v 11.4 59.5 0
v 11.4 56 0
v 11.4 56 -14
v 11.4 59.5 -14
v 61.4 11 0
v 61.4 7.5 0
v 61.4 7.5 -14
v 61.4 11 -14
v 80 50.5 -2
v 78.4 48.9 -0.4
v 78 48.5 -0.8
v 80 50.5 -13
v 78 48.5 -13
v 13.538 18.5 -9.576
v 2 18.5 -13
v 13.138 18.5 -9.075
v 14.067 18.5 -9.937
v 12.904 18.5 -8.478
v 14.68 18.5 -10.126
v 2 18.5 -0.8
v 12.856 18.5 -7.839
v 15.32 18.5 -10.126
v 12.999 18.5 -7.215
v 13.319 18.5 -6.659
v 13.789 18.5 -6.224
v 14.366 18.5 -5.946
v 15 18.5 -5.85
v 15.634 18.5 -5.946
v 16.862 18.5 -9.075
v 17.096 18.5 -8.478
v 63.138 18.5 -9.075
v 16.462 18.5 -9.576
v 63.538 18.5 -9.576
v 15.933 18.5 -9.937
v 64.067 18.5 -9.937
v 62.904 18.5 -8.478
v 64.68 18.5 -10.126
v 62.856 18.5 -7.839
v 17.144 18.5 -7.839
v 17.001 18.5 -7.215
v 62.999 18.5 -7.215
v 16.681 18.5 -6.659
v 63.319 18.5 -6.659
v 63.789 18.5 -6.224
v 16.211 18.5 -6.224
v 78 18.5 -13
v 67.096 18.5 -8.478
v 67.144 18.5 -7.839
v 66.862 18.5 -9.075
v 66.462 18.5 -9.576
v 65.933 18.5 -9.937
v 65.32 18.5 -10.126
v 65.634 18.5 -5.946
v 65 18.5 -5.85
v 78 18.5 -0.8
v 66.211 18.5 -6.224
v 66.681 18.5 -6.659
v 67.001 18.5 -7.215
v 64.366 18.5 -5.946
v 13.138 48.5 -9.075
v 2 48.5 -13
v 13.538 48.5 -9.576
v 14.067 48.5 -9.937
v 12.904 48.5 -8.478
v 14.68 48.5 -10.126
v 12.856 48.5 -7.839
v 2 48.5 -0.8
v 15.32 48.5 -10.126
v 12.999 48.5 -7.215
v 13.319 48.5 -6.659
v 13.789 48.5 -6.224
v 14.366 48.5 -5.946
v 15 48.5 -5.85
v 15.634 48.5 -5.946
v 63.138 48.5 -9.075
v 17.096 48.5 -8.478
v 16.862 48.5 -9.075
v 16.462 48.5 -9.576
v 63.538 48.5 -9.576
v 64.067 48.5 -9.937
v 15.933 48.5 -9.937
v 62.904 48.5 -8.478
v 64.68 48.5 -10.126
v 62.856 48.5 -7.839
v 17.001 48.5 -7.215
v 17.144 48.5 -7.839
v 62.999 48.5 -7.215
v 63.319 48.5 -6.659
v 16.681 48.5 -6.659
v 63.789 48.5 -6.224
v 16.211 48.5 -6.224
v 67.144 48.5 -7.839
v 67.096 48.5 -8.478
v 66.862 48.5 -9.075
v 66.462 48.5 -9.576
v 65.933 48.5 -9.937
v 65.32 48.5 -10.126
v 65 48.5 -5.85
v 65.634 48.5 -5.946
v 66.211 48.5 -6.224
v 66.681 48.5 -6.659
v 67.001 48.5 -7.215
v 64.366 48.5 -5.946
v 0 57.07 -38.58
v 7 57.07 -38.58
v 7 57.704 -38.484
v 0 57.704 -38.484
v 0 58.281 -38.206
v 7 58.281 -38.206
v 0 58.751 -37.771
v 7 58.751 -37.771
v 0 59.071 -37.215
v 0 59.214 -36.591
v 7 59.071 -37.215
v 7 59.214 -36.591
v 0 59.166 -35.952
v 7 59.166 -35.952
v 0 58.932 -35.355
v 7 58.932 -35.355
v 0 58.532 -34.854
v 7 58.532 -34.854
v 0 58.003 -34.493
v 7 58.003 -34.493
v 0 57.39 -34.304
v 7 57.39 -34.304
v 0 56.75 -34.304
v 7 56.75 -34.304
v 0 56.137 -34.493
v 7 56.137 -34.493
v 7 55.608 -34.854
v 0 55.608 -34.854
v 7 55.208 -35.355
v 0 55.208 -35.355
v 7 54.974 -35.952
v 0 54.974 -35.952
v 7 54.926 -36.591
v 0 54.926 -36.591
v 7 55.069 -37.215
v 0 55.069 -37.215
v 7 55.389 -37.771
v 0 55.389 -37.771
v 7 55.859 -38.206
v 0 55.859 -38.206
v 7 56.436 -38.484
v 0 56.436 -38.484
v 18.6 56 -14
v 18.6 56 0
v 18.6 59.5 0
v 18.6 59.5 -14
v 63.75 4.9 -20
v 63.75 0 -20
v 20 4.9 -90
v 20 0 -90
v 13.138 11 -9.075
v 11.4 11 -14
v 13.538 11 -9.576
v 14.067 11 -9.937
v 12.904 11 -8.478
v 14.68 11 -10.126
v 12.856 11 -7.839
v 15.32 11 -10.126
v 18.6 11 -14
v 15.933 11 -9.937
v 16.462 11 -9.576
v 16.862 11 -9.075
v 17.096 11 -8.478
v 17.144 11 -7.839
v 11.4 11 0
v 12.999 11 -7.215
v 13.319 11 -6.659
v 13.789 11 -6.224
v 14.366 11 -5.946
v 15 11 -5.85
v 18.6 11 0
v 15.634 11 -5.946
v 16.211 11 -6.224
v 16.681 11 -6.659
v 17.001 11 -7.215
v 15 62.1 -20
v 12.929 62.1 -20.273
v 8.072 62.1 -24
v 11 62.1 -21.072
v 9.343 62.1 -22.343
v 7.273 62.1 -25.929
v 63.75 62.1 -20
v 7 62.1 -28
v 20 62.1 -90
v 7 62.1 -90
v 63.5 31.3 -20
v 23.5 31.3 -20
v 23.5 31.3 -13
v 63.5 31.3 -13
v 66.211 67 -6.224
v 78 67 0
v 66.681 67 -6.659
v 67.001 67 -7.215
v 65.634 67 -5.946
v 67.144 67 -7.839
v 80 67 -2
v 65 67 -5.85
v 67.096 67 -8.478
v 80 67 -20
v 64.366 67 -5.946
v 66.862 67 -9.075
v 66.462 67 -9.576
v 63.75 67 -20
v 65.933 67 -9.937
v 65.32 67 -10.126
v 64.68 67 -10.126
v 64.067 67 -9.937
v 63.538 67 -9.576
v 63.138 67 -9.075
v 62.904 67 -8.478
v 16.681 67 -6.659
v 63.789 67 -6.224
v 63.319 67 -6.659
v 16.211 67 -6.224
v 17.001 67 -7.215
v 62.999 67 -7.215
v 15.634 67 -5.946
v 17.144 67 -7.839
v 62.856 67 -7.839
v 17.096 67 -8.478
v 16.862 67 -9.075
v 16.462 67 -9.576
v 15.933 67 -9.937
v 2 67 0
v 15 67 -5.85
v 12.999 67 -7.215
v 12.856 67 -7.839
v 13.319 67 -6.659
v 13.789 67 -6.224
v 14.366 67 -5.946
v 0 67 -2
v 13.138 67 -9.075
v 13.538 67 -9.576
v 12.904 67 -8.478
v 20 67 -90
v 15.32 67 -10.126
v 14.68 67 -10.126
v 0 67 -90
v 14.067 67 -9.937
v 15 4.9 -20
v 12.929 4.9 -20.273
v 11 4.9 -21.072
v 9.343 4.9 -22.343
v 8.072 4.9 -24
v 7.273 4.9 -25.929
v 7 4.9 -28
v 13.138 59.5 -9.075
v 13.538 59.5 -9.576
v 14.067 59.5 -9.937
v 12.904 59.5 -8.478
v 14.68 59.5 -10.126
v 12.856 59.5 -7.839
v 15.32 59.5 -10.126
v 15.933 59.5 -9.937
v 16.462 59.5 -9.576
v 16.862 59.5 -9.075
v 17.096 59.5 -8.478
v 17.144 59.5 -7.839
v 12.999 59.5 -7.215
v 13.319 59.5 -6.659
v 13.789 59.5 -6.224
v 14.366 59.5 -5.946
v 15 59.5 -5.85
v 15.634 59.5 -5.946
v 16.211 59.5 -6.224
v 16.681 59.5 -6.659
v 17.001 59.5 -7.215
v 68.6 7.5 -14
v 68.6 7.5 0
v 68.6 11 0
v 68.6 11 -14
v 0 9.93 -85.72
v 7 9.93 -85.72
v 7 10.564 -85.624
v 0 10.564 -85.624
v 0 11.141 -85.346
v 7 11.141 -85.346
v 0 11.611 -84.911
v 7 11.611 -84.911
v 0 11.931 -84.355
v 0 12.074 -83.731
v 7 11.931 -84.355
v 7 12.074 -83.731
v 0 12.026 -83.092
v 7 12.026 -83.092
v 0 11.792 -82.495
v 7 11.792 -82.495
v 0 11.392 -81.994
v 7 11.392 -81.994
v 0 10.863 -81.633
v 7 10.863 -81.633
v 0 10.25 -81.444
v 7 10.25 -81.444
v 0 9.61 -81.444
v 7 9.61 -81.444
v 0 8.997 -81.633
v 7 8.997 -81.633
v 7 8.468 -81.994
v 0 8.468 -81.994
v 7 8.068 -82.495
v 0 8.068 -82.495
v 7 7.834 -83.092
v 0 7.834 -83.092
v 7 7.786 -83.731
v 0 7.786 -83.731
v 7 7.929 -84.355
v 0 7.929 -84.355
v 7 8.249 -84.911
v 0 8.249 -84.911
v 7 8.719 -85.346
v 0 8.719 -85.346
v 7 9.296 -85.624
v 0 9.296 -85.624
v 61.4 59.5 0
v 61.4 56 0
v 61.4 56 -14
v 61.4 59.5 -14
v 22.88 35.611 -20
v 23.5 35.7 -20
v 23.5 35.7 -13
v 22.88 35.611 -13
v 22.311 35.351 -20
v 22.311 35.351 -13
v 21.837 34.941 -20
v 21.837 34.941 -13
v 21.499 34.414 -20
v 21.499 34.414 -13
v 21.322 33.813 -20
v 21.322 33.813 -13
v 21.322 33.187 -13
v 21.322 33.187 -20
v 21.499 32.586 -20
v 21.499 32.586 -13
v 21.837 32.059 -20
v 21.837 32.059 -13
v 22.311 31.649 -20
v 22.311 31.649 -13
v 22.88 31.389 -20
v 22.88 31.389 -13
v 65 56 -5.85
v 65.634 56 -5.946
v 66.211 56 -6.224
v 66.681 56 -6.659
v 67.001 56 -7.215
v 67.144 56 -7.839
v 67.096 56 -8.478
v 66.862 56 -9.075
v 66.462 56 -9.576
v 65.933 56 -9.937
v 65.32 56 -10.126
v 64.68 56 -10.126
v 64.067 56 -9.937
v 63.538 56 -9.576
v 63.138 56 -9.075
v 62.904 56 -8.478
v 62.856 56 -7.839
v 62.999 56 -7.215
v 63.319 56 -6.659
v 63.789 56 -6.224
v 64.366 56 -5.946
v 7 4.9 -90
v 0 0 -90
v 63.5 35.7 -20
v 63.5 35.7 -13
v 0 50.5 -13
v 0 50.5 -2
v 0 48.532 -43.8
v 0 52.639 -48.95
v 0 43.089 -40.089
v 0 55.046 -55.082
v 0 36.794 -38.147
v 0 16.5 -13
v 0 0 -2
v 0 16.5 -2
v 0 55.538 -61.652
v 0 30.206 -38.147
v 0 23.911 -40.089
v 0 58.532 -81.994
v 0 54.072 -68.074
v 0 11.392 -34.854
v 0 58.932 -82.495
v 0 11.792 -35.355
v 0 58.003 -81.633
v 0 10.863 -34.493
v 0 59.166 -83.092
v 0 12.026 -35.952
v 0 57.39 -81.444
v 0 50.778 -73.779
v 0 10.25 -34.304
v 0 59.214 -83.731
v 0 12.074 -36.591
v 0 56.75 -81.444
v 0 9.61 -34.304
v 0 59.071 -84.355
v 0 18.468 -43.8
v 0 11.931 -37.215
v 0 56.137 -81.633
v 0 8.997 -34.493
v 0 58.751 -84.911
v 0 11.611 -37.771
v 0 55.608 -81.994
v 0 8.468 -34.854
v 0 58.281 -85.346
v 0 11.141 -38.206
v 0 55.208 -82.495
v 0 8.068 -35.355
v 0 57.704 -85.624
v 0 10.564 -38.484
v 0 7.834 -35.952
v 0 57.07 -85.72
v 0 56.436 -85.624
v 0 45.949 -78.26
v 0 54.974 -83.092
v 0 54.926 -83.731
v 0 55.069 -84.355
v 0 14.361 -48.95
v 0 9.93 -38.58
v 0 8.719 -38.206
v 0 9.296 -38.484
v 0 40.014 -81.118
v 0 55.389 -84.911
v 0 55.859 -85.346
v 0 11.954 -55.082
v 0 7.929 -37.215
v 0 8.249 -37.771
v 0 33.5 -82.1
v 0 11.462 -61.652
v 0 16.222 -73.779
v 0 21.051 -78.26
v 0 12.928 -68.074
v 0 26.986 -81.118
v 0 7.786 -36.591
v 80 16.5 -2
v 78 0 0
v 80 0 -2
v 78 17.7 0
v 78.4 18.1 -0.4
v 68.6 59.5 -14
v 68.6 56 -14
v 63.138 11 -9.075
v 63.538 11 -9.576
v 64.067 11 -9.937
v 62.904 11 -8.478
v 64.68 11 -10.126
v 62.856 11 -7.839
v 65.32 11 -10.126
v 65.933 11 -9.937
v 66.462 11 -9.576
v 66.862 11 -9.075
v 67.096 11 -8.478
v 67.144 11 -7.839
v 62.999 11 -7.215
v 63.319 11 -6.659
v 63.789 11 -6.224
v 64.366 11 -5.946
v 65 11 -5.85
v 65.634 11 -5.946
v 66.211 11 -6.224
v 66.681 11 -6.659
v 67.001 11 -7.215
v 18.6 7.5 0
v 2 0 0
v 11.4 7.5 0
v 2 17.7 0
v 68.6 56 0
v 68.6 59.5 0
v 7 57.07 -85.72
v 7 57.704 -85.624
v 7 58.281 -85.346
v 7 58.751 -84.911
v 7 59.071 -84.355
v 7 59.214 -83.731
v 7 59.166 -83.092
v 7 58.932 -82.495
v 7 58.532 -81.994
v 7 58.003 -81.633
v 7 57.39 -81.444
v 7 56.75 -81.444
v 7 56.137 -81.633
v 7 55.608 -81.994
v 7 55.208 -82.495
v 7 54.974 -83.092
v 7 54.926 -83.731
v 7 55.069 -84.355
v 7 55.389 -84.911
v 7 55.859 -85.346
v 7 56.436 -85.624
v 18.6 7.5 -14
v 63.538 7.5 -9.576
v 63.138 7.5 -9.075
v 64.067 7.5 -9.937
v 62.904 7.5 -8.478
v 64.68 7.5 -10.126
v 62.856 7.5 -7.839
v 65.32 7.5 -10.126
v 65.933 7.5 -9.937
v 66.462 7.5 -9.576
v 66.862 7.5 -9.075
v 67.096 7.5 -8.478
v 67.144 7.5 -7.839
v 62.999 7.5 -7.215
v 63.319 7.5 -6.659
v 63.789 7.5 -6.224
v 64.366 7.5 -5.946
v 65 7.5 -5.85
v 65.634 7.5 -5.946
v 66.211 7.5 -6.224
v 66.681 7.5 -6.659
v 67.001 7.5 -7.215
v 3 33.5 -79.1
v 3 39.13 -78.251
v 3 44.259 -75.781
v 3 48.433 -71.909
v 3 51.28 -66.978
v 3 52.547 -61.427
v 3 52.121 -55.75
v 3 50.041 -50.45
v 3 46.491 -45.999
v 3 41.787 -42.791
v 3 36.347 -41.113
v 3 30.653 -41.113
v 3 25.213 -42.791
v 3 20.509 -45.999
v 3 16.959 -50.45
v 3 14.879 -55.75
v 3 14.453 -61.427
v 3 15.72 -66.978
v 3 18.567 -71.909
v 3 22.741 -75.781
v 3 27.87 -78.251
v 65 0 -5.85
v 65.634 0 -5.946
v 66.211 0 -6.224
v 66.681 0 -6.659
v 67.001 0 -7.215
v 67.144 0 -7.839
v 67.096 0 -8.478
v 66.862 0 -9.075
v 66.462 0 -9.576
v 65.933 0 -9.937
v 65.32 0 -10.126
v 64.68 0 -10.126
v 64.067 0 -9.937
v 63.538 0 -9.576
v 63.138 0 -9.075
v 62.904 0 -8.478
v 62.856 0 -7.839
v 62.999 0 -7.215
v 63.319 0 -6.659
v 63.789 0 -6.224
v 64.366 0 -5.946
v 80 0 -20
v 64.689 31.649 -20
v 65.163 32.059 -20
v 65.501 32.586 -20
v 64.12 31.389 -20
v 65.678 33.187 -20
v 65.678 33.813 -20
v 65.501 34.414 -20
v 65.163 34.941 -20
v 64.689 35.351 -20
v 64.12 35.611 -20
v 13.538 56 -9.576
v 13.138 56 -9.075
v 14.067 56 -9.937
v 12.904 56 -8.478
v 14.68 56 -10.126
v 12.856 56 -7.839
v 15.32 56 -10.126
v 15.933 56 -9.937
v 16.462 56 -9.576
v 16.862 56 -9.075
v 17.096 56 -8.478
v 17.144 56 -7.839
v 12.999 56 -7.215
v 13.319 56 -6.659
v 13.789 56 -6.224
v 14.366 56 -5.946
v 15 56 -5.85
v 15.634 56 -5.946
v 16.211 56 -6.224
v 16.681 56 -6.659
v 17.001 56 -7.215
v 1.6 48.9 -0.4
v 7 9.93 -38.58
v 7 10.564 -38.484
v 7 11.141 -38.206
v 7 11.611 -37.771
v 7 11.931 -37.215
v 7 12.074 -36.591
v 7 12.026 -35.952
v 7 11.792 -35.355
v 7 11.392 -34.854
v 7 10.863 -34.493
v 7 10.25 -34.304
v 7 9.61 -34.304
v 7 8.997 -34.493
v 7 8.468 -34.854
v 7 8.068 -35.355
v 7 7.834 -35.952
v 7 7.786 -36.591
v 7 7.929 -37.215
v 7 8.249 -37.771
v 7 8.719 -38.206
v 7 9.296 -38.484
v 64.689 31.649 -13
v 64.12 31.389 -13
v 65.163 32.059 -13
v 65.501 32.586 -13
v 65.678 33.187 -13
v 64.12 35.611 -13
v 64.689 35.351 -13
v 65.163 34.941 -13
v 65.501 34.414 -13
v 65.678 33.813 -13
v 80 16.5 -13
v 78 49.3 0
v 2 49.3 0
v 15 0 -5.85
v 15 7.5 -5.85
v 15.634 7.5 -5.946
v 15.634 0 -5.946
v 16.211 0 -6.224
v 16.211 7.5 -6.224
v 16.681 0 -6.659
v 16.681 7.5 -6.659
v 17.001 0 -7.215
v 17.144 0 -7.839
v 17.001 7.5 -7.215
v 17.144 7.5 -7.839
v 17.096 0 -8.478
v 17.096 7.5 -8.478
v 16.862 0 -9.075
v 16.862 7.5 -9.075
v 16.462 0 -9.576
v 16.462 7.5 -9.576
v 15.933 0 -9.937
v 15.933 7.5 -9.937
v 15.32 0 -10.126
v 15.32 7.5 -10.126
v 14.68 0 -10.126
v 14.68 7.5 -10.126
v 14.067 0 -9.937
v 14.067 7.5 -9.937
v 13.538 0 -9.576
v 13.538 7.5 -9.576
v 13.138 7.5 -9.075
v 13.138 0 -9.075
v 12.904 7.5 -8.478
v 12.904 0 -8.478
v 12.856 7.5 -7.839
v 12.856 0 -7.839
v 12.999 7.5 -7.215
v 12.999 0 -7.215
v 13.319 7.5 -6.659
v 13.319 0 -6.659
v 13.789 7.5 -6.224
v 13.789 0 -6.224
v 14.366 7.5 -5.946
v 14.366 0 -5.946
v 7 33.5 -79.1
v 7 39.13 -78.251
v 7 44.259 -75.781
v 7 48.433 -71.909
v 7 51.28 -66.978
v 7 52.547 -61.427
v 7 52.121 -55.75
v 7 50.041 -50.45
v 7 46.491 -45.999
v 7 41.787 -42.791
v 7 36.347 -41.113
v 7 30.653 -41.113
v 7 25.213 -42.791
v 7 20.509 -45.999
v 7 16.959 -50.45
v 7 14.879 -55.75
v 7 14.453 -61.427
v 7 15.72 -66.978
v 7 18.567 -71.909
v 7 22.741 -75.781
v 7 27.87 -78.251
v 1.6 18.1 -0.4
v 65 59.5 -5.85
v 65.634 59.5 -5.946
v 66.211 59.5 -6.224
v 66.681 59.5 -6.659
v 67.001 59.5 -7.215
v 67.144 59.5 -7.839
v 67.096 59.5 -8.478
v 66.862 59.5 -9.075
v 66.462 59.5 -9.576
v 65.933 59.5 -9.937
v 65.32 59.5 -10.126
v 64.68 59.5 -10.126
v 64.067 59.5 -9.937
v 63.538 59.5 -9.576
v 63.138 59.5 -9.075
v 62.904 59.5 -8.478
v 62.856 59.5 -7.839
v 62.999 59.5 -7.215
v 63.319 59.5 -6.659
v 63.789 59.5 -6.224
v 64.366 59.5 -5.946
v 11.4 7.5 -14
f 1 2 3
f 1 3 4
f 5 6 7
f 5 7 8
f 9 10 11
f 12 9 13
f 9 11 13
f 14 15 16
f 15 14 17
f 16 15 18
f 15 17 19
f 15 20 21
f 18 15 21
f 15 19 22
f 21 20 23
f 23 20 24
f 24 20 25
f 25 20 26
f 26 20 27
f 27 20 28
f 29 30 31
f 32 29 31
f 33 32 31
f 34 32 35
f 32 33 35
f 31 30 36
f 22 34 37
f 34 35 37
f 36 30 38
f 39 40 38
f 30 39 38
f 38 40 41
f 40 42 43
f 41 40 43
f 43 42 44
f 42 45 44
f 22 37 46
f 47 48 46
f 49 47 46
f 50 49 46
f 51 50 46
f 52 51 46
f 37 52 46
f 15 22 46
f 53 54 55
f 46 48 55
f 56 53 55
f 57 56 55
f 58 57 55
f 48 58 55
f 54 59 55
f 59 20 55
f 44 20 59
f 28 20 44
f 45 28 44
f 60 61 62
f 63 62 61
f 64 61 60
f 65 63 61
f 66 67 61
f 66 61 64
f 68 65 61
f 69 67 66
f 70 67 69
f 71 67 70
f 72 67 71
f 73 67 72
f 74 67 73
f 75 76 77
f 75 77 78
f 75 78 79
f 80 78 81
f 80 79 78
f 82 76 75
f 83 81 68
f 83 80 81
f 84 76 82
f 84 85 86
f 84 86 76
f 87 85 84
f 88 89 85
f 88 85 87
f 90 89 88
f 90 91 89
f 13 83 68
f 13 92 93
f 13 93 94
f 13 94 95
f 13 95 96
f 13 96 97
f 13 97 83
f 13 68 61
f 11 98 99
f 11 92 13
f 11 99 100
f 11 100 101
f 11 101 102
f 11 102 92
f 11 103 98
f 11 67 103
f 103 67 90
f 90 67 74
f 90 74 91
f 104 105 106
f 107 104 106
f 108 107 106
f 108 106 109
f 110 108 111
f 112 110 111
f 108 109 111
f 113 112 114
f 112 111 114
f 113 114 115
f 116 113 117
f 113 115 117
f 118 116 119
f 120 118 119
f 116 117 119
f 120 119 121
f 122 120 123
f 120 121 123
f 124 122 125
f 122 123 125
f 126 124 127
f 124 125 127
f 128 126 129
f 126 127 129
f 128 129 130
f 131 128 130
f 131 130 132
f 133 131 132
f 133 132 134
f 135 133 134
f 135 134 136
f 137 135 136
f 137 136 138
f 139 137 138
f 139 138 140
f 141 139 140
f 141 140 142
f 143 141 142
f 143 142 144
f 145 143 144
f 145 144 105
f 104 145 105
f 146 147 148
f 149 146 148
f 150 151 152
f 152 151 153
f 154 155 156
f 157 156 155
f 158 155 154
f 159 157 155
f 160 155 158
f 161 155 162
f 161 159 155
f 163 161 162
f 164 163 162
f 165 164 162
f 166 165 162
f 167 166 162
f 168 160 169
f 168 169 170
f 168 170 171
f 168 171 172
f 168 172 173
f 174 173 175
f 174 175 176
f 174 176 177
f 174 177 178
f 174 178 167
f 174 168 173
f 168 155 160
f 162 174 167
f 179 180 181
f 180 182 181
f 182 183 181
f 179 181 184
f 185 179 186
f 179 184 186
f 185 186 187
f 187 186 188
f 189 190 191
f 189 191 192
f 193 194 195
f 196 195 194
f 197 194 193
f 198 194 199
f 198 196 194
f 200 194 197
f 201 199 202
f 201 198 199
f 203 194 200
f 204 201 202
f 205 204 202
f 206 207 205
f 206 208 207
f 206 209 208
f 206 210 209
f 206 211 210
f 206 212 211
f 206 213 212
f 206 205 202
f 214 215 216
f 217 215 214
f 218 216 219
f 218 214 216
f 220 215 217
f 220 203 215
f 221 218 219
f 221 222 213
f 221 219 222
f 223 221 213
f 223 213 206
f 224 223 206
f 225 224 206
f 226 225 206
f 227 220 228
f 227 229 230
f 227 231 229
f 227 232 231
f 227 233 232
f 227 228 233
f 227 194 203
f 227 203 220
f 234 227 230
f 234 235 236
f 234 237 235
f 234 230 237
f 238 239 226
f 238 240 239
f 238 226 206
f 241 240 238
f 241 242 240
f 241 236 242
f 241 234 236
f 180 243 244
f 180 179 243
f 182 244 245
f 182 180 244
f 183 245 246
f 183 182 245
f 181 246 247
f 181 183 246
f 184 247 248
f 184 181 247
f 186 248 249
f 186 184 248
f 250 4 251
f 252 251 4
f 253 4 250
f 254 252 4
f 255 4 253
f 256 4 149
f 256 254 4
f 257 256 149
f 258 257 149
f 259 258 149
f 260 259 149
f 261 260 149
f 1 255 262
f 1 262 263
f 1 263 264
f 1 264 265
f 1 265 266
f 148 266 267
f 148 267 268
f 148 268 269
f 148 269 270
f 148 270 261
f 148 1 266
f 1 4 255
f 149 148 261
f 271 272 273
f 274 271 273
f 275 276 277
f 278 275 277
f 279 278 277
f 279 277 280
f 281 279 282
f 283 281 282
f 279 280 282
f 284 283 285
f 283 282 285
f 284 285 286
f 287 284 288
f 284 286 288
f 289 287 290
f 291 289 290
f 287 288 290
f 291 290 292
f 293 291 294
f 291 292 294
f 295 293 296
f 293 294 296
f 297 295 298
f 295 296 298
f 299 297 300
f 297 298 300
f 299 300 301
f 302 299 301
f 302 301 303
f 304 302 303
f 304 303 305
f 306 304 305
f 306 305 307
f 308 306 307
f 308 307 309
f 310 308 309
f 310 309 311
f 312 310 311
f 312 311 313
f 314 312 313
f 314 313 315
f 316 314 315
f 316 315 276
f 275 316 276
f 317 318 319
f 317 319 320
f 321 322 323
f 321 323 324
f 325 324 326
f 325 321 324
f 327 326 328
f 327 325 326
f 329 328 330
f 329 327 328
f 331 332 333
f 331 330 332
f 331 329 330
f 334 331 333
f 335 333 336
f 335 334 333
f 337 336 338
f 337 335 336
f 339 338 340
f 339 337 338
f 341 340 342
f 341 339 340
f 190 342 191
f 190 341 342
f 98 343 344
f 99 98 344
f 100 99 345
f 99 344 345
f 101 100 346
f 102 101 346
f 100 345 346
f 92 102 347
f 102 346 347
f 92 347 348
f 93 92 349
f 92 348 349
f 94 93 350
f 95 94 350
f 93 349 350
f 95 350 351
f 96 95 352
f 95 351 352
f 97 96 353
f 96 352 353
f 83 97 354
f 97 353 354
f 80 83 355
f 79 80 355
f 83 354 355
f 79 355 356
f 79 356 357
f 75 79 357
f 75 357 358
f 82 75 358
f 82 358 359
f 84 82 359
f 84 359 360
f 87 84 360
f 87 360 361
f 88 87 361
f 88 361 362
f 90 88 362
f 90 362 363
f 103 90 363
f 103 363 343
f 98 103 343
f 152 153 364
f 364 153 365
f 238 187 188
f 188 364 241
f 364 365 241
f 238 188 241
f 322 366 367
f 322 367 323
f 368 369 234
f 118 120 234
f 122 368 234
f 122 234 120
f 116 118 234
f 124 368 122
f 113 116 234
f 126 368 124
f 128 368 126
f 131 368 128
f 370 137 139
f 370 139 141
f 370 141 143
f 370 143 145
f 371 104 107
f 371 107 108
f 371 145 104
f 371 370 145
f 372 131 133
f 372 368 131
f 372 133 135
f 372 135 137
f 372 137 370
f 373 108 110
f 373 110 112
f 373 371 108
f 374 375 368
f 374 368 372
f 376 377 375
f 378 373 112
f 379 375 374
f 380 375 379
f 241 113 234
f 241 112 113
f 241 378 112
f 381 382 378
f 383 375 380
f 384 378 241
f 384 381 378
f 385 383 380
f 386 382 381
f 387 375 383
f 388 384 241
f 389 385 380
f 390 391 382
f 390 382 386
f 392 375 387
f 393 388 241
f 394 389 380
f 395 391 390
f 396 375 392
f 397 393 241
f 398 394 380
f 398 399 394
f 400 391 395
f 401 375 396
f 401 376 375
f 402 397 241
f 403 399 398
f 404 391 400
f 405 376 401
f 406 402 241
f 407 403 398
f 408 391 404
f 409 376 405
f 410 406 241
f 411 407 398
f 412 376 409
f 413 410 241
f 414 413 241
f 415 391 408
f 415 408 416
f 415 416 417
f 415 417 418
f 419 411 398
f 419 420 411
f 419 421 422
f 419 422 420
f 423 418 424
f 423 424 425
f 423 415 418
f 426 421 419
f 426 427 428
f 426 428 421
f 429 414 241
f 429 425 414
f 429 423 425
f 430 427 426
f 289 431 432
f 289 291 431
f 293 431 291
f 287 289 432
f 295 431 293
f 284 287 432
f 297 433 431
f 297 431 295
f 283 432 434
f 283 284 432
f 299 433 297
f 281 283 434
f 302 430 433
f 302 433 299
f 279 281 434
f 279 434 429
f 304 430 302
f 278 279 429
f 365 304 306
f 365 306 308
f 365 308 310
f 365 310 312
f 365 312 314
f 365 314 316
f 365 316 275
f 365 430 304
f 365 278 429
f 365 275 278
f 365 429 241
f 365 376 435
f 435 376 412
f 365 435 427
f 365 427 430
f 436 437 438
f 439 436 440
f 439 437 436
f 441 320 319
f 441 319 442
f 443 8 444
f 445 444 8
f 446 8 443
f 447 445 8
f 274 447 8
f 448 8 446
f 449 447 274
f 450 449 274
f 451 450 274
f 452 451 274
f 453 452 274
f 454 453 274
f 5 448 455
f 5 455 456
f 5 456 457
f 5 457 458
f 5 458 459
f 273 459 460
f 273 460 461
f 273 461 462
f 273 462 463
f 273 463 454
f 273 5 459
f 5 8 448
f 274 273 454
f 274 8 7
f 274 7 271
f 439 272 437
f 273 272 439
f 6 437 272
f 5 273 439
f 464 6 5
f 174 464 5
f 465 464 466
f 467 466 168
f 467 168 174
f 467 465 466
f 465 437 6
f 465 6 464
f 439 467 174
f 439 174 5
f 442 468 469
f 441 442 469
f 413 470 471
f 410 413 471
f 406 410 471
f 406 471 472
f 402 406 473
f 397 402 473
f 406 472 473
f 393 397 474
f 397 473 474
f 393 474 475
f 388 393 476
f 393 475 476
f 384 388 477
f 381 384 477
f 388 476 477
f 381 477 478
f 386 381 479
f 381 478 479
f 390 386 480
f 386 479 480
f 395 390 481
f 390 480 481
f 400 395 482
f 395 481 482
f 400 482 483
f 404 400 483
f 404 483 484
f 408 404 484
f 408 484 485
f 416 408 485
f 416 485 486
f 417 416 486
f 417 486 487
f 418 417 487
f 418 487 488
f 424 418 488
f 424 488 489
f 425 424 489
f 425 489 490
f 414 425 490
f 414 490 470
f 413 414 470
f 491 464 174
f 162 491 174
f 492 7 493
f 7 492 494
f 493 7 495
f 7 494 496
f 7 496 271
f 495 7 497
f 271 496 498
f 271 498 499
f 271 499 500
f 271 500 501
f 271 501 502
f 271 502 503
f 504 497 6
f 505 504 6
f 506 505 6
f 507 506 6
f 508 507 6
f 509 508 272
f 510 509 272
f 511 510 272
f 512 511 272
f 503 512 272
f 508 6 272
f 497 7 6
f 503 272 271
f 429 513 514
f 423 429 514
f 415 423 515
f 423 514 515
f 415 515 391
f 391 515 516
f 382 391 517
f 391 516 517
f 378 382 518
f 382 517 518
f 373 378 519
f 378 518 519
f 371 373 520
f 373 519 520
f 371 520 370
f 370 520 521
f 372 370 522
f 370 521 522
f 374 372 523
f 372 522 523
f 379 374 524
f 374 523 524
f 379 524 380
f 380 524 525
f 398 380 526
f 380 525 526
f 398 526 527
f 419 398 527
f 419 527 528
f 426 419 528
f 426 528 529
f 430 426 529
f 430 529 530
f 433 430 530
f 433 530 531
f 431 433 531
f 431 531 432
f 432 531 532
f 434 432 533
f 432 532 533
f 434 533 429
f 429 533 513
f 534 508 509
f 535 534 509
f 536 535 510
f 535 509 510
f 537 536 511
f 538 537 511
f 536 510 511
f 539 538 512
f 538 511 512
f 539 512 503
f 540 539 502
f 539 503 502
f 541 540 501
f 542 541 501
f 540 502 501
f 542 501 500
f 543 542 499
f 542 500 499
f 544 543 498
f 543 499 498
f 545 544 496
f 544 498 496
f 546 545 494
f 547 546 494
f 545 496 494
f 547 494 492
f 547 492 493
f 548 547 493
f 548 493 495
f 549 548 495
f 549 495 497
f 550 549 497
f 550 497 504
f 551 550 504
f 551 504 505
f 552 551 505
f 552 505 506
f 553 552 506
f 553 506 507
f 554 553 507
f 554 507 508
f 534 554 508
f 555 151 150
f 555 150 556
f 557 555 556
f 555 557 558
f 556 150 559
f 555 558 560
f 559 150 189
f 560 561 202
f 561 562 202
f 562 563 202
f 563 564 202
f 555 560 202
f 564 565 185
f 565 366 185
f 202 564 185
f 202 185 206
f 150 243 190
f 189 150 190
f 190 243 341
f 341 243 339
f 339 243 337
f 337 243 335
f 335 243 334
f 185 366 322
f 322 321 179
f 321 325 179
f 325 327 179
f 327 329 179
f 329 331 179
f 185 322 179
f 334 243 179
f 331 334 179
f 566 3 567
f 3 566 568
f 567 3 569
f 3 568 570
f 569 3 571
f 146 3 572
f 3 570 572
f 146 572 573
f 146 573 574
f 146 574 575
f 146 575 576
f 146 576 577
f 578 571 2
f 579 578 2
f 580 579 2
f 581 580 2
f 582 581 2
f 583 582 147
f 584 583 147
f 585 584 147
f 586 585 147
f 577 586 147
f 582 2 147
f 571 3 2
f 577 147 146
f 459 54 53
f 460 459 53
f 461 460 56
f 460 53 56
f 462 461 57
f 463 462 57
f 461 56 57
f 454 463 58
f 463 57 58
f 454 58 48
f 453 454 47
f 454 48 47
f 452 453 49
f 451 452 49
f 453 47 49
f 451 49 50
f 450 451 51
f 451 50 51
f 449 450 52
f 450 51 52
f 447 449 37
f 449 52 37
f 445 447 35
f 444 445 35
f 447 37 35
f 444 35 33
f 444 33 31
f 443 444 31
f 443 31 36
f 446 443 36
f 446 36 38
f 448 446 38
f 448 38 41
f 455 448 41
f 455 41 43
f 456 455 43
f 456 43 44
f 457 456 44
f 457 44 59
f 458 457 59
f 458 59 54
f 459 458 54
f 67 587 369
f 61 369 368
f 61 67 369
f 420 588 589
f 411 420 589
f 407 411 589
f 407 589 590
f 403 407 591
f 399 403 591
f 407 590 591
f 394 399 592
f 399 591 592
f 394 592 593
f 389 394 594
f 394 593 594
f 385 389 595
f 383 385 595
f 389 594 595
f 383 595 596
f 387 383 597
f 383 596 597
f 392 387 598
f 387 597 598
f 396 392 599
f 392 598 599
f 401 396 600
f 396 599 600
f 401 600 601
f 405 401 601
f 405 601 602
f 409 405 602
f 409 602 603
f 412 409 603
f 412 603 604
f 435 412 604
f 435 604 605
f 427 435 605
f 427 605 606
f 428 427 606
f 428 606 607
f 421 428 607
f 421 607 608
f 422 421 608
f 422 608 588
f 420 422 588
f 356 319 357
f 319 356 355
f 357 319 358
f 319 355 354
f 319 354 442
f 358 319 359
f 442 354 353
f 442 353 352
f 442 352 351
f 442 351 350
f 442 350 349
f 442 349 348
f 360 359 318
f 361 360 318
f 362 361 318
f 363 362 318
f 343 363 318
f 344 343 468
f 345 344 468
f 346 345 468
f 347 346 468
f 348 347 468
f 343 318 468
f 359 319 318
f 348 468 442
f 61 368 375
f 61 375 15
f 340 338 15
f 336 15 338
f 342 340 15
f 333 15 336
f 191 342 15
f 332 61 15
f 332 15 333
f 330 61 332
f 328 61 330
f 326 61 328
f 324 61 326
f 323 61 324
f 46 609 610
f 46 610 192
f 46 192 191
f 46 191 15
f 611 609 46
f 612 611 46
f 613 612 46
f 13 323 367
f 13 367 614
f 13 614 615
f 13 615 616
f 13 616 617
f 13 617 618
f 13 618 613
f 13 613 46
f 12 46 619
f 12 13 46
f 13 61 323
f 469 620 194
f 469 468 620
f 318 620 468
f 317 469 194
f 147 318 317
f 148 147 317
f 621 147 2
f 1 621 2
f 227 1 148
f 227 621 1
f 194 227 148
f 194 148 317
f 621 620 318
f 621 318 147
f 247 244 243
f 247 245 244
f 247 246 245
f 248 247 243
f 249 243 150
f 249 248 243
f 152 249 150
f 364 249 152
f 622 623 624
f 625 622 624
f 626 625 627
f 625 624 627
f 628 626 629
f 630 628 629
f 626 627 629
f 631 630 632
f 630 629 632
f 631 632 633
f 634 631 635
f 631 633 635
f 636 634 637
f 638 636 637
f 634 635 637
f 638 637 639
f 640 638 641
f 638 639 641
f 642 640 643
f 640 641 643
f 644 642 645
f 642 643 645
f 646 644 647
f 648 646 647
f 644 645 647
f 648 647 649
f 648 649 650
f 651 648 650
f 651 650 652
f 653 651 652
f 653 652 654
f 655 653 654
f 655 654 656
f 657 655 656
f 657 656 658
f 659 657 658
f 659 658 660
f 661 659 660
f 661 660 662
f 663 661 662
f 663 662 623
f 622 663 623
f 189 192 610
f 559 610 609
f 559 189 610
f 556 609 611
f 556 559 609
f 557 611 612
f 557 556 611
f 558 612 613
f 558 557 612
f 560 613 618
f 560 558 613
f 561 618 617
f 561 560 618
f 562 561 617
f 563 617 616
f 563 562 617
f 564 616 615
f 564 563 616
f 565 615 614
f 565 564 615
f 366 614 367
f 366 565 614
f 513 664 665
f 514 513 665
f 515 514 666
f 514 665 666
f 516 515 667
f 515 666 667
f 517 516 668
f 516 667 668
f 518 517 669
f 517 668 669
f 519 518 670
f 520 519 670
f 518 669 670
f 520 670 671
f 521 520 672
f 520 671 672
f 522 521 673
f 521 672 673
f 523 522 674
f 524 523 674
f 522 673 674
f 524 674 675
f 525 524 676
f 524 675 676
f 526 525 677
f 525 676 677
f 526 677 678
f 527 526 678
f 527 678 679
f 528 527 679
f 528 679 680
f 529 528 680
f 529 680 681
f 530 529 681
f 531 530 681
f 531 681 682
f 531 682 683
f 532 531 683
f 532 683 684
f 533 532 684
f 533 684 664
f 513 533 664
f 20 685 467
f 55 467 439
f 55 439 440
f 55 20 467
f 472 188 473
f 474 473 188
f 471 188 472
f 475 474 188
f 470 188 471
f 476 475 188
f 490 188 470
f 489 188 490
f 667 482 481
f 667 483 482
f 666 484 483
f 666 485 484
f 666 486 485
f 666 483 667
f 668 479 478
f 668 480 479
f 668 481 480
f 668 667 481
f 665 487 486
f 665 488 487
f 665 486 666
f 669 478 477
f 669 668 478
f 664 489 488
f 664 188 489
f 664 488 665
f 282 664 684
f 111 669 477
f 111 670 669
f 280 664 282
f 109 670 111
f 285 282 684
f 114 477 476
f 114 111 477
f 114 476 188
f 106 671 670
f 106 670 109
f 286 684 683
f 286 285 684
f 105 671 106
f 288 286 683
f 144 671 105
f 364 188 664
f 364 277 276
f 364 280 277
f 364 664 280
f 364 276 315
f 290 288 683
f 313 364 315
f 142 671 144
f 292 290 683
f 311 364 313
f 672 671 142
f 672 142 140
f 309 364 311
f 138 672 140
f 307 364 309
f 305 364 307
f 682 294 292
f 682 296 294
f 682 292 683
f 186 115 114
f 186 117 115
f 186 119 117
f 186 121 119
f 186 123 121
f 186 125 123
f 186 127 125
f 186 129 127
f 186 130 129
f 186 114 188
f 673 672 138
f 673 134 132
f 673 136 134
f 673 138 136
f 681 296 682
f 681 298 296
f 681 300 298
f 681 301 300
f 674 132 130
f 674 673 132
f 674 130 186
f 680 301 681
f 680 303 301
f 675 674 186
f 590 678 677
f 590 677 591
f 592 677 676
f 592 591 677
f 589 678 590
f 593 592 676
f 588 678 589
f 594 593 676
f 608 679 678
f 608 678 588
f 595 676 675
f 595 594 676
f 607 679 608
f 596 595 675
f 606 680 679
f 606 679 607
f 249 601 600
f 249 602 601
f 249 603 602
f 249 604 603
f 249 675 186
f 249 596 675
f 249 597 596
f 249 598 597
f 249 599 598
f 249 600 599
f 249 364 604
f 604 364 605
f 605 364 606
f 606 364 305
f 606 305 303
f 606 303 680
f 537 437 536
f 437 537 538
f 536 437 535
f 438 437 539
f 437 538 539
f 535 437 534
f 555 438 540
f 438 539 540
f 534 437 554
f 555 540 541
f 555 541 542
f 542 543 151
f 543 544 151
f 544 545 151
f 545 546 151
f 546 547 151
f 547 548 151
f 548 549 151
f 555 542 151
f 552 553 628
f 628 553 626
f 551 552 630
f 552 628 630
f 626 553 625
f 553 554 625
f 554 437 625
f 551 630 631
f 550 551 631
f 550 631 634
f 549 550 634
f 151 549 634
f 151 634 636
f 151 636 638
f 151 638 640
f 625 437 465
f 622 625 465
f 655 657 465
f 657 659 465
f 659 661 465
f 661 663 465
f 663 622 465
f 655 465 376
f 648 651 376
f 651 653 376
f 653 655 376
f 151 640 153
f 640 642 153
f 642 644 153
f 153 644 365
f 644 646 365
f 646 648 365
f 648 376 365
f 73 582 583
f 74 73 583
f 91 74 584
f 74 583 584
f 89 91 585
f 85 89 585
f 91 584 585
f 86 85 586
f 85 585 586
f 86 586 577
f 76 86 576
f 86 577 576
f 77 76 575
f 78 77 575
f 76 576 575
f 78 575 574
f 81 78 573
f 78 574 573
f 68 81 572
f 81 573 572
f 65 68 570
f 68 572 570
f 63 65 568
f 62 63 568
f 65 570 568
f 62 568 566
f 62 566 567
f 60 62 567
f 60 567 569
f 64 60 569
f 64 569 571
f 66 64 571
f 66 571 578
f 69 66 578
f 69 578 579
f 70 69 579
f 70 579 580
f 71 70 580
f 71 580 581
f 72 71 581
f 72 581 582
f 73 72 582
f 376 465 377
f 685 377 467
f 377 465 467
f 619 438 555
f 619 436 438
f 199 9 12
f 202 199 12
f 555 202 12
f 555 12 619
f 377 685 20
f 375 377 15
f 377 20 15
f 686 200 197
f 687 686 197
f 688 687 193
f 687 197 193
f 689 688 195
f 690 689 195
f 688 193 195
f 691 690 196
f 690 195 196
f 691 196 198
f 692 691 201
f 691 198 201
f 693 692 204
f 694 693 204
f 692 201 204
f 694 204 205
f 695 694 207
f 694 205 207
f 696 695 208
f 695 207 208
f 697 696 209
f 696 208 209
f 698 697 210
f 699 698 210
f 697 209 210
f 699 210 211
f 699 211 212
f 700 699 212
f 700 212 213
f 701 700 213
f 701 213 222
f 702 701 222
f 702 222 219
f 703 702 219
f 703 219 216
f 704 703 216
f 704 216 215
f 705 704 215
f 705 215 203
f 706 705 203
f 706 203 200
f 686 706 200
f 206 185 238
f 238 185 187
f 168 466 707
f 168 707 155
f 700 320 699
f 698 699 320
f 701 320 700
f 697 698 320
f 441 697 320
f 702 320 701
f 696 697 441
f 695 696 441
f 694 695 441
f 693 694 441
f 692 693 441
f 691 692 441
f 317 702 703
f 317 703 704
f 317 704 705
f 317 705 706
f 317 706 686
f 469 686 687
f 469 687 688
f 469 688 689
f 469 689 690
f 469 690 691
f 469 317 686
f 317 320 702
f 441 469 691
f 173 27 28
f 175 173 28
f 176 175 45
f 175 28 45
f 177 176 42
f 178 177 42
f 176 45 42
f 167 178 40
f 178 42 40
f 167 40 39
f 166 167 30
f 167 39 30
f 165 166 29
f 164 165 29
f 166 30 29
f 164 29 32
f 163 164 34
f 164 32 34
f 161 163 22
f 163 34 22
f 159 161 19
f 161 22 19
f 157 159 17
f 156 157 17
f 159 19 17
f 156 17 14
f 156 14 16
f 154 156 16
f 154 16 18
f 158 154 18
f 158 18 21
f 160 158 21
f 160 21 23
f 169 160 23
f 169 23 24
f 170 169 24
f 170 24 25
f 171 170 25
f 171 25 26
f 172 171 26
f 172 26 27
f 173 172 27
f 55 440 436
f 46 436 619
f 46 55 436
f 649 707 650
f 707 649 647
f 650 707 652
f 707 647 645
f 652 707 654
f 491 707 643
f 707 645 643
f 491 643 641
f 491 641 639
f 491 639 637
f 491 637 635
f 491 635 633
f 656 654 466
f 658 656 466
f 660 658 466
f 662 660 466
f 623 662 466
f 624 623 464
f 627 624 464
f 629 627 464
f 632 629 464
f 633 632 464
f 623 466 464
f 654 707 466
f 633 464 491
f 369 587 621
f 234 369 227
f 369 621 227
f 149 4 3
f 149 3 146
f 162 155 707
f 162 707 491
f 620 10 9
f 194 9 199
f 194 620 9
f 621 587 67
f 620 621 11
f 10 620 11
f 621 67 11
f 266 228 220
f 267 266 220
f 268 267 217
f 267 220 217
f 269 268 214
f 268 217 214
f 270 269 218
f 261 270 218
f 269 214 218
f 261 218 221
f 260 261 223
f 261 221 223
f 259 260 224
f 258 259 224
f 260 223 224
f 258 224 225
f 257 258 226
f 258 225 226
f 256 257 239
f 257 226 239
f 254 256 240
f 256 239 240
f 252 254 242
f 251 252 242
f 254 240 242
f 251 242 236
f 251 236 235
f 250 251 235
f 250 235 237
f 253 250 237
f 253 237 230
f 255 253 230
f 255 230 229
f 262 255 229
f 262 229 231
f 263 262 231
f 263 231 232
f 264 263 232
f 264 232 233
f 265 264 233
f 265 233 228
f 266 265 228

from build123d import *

# Parameters (mm, degrees)
BOSS_EXTRUDE1_DEPTH = 67
SKETCH2_R           = 2.15
SKETCH2_R_2         = 19.1
CUT_EXTRUDE1_DEPTH  = 67
SKETCH3_W           = 70
SKETCH3_H           = 4.9
BOSS_EXTRUDE2_DEPTH = 63
SKETCH4_W           = 20
SKETCH4_H           = 67
BOSS_EXTRUDE3_DEPTH = 10
CHAMFER1_SIZE       = 80
CHAMFER1_SIZE_2     = 50
SKETCH6_W           = 80
SKETCH6_H           = 30
CUT_EXTRUDE2_DEPTH  = 13
SKETCH7_R           = 2.15
CUT_EXTRUDE3_DEPTH  = 100
CUT_EXTRUDE4_DEPTH  = 100
FILLET2_R           = 8
SKETCH9_W           = 7.2
SKETCH9_H           = 3.5
CUT_EXTRUDE5_DEPTH  = 14
CHAMFER2_SIZE       = 2
CHAMFER3_SIZE       = 2
CHAMFER4_SIZE       = 0.8
CHAMFER5_SIZE       = 3


with BuildPart() as part:
    # Sketch1 → Boss-Extrude1 (new body)
    with BuildSketch(Plane(origin=(0, 0, 0), x_dir=(1, 0, 0), z_dir=(0, 1, 0))):
        Polygon((0, 0), (0, 90), (7, 90), (7, 20), (70, 20), (70, 0), align=None)
    extrude(amount=BOSS_EXTRUDE1_DEPTH)

    # Sketch2 → Cut-Extrude1 (cut)
    with BuildSketch(Plane(origin=(7, 0, 0), x_dir=(0, 0, -1), z_dir=(1, 0, 0))):
        with Locations((83.57, 57.07)):
            Circle(SKETCH2_R)
        with Locations((36.43, 57.07)):
            Circle(SKETCH2_R)
        with Locations((36.43, 9.93)):
            Circle(SKETCH2_R)
        with Locations((83.57, 9.93)):
            Circle(SKETCH2_R)
        with Locations((60, 33.5)):
            Circle(SKETCH2_R_2)
    extrude(amount=-CUT_EXTRUDE1_DEPTH, mode=Mode.SUBTRACT)

    # Sketch3 → Boss-Extrude2 (add)
    with BuildSketch(Plane(origin=(7, 0, 0), x_dir=(0, 0, -1), z_dir=(1, 0, 0))):
        with Locations((55, 64.55)):
            Rectangle(SKETCH3_W, SKETCH3_H)
        with Locations((55, 2.45)):
            Rectangle(SKETCH3_W, SKETCH3_H)
    extrude(amount=BOSS_EXTRUDE2_DEPTH)

    # Sketch4 → Boss-Extrude3 (add)
    with BuildSketch(Plane(origin=(70, 0, 0), x_dir=(0, 0, -1), z_dir=(1, 0, 0))):
        with Locations((10, 33.5)):
            Rectangle(SKETCH4_W, SKETCH4_H)
    extrude(amount=BOSS_EXTRUDE3_DEPTH)

    # Chamfer1
    # the kernel refuses this chamfer: 80, 50 mm, written as the material it takes off along each edge
    with BuildSketch(Plane(origin=(70, -206.827451207, -90), x_dir=(0.020500139102813345, 0, 0.9997898500668855), z_dir=(0, 1, 0))) as chamfer1_piece_1_section:
        Polygon((CHAMFER1_SIZE * 0.999789850067, -CHAMFER1_SIZE * 0.0205001391028), (-CHAMFER1_SIZE_2 * 0.0205001391028, -CHAMFER1_SIZE_2 * 0.999789850067), (0, 0), align=None)
    chamfer1_piece_1 = extrude(amount=418.554902414, mode=Mode.PRIVATE)
    chamfer1_piece_1 = split(chamfer1_piece_1, bisect_by=Plane(origin=(53.400446445, 2.45, -20), z_dir=(0, 0, -1)), keep=Keep.TOP, mode=Mode.PRIVATE)
    add(chamfer1_piece_1, mode=Mode.SUBTRACT)
    with BuildSketch(Plane(origin=(70, 273.827451207, -90), x_dir=(0.020500139102813345, 0, 0.9997898500668855), z_dir=(0, -1, 0))) as chamfer1_piece_2_section:
        Polygon((CHAMFER1_SIZE * 0.999789850067, CHAMFER1_SIZE * 0.0205001391028), (-CHAMFER1_SIZE_2 * 0.0205001391028, CHAMFER1_SIZE_2 * 0.999789850067), (0, 0), align=None)
    chamfer1_piece_2 = extrude(amount=418.554902414, mode=Mode.PRIVATE)
    chamfer1_piece_2 = split(chamfer1_piece_2, bisect_by=Plane(origin=(53.400446445, 64.55, -20), z_dir=(0, 0, -1)), keep=Keep.TOP, mode=Mode.PRIVATE)
    add(chamfer1_piece_2, mode=Mode.SUBTRACT)

    # Sketch6 → Cut-Extrude2 (cut)
    with BuildSketch(Plane.XY):
        with Locations((40, 33.5)):
            Rectangle(SKETCH6_W, SKETCH6_H)
    extrude(amount=-CUT_EXTRUDE2_DEPTH, mode=Mode.SUBTRACT)

    # Sketch7 → Cut-Extrude3 (cut)
    with BuildSketch(Plane(origin=(0, 67, 0), x_dir=(1, 0, 0), z_dir=(0, 1, 0))):
        with Locations(Location((15, 8, 0), (0, 0, 270))):
            Circle(SKETCH7_R)
        with Locations(Location((65, 8, 0), (0, 0, 270))):
            Circle(SKETCH7_R)
    extrude(amount=-CUT_EXTRUDE3_DEPTH, mode=Mode.SUBTRACT)

    # Sketch8 → Cut-Extrude4 (cut)
    with BuildSketch(Plane(origin=(0, 0, -20), x_dir=(-1, 0, 0), z_dir=(0, 0, -1))):
        with BuildLine():
            Line((-63.5, 35.7), (-23.5, 35.7))
            ThreePointArc((-23.5, 35.7), (-21.3, 33.5), (-23.5, 31.3))
            Line((-23.5, 31.3), (-63.5, 31.3))
            ThreePointArc((-63.5, 31.3), (-65.7, 33.5), (-63.5, 35.7))
        make_face()
    extrude(amount=-CUT_EXTRUDE4_DEPTH, mode=Mode.SUBTRACT)

    # Fillet2
    fillet2_edges = [part.edges().sort_by_distance(p)[0] for p in [
        (7, 33.5, -20),
    ]]
    fillet(fillet2_edges, radius=FILLET2_R)

    # Sketch9 → Cut-Extrude5 (cut)
    with BuildSketch(Plane.XY):
        with Locations((65, 57.75)):
            Rectangle(SKETCH9_W, SKETCH9_H)
        with Locations((15, 57.75)):
            Rectangle(SKETCH9_W, SKETCH9_H)
        with Locations((65, 9.25)):
            Rectangle(SKETCH9_W, SKETCH9_H)
        with Locations((15, 9.25)):
            Rectangle(SKETCH9_W, SKETCH9_H)
    extrude(amount=-CUT_EXTRUDE5_DEPTH, mode=Mode.SUBTRACT)

    # Chamfer2
    chamfer2_edges = [part.edges().sort_by_distance(p)[0] for p in [
        (80, 48.5, -6.5),
        (80, 18.5, -6.5),
        (0, 18.5, -6.5),
        (0, 48.5, -6.5),
    ]]
    chamfer(chamfer2_edges, length=CHAMFER2_SIZE)

    # Chamfer3
    chamfer3_edges = [part.edges().sort_by_distance(p)[0] for p in [
        (80, 58.75, 0),
        (80, 8.25, 0),
        (0, 58.75, 0),
        (0, 8.25, 0),
    ]]
    chamfer(chamfer3_edges, length=CHAMFER3_SIZE)

    # Chamfer4
    chamfer4_edges = [part.edges().sort_by_distance(p)[0] for p in [
        (40, 18.5, 0),
        (40, 48.5, 0),
    ]]
    chamfer(chamfer4_edges, length=CHAMFER4_SIZE)

    # Chamfer5
    chamfer5_edges = [part.edges().sort_by_distance(p)[0] for p in [
        (0, 33.5, -40.9),
    ]]
    chamfer(chamfer5_edges, length=CHAMFER5_SIZE)


solid = part.part
